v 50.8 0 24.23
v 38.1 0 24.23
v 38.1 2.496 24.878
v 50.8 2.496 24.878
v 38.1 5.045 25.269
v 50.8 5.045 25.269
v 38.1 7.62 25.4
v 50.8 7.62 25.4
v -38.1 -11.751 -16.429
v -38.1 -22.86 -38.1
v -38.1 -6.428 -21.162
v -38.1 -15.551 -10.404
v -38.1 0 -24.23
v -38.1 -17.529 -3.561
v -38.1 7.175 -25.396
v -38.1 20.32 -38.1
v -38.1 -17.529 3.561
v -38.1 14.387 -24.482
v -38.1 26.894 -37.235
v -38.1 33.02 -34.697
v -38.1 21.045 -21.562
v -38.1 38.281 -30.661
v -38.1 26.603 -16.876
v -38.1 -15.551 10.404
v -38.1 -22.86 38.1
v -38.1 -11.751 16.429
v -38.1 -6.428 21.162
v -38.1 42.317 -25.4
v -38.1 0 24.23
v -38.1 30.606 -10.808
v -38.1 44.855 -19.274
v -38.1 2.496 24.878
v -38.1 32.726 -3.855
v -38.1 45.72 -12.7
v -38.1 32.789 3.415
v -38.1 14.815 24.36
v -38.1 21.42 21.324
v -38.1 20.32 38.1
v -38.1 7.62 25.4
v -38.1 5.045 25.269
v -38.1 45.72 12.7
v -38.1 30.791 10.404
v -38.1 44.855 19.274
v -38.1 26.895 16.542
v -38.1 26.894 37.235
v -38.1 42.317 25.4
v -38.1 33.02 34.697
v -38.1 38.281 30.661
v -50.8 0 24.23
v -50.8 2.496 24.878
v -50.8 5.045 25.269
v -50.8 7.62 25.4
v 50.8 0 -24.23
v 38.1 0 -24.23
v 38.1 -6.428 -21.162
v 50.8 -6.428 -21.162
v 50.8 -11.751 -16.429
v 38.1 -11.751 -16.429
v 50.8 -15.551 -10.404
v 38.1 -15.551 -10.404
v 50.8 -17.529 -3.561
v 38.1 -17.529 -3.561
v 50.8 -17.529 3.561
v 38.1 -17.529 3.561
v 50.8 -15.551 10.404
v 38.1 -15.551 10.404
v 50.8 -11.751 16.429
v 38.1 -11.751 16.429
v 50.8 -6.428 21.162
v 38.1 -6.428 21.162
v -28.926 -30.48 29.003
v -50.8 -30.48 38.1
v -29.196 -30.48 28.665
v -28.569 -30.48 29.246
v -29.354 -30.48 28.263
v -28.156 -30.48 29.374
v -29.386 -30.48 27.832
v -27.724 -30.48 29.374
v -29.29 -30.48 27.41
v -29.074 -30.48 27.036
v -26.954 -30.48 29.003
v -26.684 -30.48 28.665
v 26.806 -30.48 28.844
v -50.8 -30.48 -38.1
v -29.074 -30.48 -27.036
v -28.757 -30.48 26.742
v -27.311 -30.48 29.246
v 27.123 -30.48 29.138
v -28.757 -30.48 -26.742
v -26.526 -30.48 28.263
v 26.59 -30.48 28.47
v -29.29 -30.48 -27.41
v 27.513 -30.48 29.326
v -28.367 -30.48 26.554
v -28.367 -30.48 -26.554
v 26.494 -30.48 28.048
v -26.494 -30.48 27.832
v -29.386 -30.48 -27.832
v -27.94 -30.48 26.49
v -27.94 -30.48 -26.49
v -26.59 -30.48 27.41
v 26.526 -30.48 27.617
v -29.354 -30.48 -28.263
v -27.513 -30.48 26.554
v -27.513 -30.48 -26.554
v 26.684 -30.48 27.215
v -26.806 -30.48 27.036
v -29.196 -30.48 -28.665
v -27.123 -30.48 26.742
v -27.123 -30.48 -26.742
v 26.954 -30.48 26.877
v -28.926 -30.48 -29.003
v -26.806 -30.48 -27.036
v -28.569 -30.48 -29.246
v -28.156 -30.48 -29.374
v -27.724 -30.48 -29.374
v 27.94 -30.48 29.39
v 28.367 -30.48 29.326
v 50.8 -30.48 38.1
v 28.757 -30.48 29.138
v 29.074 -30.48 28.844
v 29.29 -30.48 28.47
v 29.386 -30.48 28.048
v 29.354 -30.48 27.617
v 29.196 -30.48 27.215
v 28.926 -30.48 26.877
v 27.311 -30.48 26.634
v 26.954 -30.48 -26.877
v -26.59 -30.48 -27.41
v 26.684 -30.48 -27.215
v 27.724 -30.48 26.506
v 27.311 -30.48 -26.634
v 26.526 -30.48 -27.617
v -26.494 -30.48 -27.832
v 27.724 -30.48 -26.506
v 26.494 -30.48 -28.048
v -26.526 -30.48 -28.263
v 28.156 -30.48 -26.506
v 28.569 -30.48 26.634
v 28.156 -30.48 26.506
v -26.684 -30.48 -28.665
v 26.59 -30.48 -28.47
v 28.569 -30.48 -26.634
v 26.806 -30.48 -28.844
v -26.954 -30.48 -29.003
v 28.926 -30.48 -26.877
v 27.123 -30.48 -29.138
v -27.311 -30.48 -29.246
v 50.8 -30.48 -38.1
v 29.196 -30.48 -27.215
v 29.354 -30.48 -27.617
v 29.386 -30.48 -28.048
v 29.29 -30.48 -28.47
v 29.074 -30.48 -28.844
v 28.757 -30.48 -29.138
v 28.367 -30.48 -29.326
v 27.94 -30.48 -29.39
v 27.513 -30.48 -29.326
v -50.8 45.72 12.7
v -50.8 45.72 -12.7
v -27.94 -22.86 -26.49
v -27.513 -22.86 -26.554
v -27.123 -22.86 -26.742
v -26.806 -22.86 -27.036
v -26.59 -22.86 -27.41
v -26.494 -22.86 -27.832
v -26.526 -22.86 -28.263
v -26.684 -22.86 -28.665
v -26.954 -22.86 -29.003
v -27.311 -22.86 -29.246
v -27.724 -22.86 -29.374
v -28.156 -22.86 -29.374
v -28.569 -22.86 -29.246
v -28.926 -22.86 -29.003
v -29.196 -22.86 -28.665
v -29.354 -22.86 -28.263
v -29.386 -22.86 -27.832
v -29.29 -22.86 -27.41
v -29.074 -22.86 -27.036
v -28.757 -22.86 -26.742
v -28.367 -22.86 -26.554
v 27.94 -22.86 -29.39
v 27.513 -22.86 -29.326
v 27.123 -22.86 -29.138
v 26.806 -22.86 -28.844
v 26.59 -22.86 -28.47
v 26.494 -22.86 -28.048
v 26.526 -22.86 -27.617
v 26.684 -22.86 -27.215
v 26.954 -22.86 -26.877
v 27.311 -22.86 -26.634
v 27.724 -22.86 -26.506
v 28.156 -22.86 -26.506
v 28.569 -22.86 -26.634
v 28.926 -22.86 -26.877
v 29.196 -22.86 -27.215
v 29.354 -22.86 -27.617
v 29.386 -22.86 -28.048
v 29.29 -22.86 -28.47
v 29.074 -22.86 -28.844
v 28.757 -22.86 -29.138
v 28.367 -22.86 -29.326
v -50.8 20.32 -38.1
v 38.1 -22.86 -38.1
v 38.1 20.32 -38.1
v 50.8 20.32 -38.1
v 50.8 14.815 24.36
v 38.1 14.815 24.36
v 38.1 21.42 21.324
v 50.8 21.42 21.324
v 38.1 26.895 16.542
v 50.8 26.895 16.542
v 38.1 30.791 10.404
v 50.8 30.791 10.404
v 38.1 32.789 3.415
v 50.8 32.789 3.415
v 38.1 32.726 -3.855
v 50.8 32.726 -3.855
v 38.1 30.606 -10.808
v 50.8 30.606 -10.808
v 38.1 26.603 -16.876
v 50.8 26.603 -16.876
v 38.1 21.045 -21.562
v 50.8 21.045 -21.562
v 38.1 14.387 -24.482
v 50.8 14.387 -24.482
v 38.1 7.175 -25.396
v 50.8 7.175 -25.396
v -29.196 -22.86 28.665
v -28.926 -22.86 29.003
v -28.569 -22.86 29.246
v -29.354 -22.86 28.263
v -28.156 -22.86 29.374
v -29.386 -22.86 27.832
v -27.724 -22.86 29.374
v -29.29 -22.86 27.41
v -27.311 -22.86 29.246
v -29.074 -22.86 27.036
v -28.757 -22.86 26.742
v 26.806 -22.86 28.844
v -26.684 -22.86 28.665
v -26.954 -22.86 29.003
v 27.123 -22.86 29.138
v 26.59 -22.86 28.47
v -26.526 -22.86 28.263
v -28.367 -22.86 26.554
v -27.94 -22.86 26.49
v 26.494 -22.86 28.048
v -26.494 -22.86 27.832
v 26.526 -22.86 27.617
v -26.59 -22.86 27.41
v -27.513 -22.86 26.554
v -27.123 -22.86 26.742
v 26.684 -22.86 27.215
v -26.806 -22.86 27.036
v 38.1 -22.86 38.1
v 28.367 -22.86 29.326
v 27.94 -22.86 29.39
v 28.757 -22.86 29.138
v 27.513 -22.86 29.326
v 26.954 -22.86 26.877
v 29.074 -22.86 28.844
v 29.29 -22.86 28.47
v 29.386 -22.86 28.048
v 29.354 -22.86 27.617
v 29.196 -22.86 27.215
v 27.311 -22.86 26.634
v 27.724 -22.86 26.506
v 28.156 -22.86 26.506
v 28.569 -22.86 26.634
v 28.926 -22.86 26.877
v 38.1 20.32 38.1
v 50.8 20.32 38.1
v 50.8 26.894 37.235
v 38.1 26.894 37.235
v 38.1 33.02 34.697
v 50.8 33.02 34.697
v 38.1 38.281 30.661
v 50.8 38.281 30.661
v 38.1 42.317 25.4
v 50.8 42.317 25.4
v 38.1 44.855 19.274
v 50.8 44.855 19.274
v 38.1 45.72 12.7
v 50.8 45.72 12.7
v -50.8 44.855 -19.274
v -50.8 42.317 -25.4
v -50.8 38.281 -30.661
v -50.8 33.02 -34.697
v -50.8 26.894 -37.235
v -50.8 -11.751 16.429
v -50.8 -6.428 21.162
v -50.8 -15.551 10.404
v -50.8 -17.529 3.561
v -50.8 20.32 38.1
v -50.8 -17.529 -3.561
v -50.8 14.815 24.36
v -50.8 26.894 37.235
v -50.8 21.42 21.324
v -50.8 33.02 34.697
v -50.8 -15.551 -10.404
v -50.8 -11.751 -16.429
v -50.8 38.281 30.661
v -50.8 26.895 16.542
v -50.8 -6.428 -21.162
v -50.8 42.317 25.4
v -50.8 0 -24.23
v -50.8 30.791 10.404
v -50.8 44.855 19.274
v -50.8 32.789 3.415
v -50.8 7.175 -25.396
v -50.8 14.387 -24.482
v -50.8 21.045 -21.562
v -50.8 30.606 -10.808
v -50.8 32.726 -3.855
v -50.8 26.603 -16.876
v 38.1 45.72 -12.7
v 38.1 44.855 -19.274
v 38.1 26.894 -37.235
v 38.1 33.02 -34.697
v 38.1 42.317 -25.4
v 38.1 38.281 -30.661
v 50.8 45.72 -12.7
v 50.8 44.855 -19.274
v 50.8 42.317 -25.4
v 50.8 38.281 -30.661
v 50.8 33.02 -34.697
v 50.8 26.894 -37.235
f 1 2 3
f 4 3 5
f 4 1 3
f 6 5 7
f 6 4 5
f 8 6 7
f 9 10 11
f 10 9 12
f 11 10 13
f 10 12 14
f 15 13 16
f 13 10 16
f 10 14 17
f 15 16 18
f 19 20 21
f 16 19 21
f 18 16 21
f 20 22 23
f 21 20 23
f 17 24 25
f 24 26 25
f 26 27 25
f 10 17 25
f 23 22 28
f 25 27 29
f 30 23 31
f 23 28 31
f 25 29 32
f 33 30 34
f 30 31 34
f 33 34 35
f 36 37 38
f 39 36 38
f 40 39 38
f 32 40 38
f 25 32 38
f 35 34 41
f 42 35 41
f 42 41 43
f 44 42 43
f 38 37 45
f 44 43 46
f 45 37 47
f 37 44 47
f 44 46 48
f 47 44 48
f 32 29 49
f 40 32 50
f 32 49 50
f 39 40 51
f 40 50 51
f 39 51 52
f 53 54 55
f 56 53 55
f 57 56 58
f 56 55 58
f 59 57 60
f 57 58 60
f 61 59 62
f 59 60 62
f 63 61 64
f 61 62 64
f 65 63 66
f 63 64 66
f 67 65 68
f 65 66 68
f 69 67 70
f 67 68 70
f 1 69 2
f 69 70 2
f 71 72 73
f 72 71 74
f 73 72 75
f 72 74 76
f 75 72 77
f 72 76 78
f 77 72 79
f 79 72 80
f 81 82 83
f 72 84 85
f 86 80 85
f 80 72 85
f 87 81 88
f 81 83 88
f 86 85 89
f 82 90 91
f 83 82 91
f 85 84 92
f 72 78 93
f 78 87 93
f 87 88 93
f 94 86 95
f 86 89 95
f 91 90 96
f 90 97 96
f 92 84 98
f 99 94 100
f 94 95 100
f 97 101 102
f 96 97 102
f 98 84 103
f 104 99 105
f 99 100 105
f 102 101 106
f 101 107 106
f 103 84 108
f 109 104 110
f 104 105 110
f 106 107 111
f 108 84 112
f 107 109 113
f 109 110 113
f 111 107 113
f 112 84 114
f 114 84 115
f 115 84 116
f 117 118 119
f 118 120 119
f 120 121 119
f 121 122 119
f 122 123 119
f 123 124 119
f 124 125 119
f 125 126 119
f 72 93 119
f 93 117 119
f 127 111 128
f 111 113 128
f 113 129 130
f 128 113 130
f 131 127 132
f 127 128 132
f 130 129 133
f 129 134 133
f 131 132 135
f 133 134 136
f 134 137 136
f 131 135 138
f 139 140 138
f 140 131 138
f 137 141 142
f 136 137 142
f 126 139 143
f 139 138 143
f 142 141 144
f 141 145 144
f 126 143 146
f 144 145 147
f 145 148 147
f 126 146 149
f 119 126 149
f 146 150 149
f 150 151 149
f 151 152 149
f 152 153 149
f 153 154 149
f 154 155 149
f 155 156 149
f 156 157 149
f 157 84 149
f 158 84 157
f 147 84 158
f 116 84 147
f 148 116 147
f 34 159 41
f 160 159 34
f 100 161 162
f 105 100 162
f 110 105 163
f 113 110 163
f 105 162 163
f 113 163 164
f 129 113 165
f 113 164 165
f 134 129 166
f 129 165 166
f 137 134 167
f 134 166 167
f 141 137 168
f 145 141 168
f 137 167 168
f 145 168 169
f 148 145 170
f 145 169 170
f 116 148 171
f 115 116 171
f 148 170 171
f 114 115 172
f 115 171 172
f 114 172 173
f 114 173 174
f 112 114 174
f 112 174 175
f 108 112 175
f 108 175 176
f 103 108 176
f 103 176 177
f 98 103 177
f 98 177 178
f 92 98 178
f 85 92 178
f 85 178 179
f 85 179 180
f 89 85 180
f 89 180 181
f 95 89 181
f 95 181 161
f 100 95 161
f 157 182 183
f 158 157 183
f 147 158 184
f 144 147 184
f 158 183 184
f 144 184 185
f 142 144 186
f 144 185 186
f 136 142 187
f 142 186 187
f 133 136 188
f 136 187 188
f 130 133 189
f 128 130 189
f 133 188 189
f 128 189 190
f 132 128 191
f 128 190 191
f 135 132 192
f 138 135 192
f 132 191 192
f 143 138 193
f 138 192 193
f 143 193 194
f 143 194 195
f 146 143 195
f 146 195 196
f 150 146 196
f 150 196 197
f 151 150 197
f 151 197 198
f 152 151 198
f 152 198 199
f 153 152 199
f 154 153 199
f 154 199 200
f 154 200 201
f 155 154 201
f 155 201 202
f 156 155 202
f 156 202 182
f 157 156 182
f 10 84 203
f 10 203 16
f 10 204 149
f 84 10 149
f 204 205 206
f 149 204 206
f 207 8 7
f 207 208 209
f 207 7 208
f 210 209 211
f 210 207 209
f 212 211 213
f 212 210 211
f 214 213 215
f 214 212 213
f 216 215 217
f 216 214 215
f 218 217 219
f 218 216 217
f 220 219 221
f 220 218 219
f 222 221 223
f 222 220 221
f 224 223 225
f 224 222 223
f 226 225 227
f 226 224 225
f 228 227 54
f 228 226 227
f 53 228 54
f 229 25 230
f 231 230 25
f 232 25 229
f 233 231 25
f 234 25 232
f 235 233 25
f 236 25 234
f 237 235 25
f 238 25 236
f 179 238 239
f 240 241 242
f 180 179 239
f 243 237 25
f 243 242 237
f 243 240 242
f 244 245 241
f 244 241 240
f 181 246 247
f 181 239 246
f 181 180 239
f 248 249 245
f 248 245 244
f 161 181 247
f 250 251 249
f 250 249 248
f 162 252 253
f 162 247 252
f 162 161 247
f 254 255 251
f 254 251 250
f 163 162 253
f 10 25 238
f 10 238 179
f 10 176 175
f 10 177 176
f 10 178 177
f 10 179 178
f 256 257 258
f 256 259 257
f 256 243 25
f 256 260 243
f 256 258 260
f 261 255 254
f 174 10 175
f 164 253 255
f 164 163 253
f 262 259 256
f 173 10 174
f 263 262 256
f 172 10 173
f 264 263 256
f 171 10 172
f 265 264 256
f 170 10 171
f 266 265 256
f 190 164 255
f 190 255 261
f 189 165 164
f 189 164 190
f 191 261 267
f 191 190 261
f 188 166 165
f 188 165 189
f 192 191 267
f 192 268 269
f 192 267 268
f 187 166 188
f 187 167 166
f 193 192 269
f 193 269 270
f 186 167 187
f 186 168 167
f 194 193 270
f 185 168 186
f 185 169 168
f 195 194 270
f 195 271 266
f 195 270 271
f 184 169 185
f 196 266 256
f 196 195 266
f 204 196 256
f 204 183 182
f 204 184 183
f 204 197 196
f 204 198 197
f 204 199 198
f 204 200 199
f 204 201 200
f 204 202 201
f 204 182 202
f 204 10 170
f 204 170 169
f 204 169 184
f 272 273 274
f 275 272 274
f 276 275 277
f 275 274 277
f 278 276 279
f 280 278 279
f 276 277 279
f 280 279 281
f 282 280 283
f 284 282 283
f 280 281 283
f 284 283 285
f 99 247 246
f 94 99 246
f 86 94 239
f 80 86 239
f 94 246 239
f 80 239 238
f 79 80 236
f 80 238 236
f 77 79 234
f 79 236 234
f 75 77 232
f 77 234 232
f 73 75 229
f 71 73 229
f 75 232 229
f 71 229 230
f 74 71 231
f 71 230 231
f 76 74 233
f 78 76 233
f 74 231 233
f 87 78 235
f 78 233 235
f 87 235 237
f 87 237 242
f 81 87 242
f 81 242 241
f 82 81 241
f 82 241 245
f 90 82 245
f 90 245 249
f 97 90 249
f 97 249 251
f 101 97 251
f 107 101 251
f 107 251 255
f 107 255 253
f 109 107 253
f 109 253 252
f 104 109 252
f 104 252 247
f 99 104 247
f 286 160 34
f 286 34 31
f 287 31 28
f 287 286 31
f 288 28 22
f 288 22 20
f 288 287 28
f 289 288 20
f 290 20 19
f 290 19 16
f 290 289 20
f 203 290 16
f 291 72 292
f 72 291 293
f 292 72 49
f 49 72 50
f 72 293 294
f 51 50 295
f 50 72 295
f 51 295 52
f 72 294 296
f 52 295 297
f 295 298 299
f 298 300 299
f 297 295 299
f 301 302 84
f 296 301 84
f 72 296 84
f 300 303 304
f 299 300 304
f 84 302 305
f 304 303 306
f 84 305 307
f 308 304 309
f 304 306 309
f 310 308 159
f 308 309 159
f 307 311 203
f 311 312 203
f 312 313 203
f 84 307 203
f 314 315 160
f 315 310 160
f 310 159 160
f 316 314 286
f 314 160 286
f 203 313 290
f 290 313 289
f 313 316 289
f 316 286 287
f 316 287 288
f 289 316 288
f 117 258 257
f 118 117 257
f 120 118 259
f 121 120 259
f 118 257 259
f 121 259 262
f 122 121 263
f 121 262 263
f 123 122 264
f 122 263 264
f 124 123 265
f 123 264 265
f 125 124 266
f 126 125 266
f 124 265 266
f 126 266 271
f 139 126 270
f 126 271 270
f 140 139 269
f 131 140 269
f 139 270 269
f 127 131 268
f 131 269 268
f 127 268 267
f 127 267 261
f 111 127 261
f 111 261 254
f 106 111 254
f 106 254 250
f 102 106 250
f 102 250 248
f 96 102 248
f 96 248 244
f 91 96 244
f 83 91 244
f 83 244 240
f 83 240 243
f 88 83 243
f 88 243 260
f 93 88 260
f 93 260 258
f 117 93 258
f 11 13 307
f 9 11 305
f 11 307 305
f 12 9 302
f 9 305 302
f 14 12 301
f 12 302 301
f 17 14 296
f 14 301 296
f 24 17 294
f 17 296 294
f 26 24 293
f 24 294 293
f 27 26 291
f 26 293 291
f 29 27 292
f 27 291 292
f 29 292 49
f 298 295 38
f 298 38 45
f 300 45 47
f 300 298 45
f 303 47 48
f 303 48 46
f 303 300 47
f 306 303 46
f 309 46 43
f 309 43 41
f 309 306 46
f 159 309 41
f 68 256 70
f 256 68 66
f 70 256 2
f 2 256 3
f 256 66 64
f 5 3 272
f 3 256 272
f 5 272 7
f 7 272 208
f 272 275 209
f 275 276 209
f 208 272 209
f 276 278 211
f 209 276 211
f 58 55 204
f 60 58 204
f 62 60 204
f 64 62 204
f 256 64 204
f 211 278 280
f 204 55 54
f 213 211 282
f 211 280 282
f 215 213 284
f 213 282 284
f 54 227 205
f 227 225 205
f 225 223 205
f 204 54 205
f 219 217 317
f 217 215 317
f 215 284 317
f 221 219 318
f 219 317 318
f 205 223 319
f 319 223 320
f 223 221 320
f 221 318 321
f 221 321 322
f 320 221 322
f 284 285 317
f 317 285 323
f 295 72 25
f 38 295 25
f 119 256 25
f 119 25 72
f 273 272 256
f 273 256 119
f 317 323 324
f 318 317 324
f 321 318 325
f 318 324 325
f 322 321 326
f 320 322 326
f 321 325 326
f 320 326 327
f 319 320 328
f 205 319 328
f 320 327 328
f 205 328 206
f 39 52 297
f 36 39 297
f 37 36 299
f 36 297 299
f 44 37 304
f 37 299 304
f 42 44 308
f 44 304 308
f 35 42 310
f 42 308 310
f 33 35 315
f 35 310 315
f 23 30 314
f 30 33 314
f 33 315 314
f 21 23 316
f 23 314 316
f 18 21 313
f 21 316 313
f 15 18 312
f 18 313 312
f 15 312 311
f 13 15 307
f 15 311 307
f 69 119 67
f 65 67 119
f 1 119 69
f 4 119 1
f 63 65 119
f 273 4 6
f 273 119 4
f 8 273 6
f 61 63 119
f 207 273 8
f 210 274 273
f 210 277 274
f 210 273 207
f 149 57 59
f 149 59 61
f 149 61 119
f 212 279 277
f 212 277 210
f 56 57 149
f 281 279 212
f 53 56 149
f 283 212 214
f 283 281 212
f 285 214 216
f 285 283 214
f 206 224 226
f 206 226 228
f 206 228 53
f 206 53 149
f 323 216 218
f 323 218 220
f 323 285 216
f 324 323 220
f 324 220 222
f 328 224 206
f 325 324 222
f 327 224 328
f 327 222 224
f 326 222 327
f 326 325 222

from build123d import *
from build123d.topology import SkipClean

# Parameters (mm, degrees)
SKETCH1_W           = 101.6
SKETCH1_H           = 76.2
BOSS_EXTRUDE1_DEPTH = 30.48
SKETCH2_R           = 25.4
BOSS_EXTRUDE2_DEPTH = 12.7
SKETCH3_W           = 76.2
SKETCH3_H           = 76.2
CUT_EXTRUDE1_DEPTH  = 22.86
SKETCH5_R           = 25.4
CUT_EXTRUDE3_DEPTH  = 256.032
SKETCH6_R           = 1.45
CUT_EXTRUDE4_DEPTH  = 256.032


with BuildPart() as part:
    # Sketch1 → Boss-Extrude1 (new body)
    with BuildSketch(Plane(origin=(0, 0, 0), x_dir=(1, 0, 0), z_dir=(0, 1, 0))):
        Rectangle(SKETCH1_W, SKETCH1_H)
    extrude(amount=-BOSS_EXTRUDE1_DEPTH)

    # Sketch2 → Boss-Extrude2 (add)
    with BuildSketch(Plane.ZY.offset(50.8)):
        with BuildLine():
            Line((-38.1, -30.48), (38.1, -30.48))
            Line((38.1, -30.48), (38.1, 20.32))
            ThreePointArc((38.1, 20.32), (30.660512242, 38.280512242), (12.7, 45.72))
            Line((12.7, 45.72), (-12.7, 45.72))
            ThreePointArc((-12.7, 45.72), (-30.660512242, 38.280512242), (-38.1, 20.32))
            Line((-38.1, 20.32), (-38.1, -30.48))
        make_face()
        with Locations((0, 7.62)):
            Circle(SKETCH2_R, mode=Mode.SUBTRACT)
    boss_extrude2 = extrude(amount=-BOSS_EXTRUDE2_DEPTH)

    # Mirror1: Boss-Extrude2 across plane
    add(boss_extrude2.mirror(Plane(origin=(0, 0, 0), x_dir=(0, 0, 1), z_dir=(1, 0, 0))))

    # Sketch3 → Cut-Extrude1 (cut)
    with BuildSketch(Plane(origin=(0, 0, 0), x_dir=(1, 0, 0), z_dir=(0, 1, 0))):
        Rectangle(SKETCH3_W, SKETCH3_H)
    extrude(amount=-CUT_EXTRUDE1_DEPTH, mode=Mode.SUBTRACT)

    # Sketch5 → Cut-Extrude3 (cut)
    with SkipClean():  # the faces are left unmerged after this step: merging them gives an invalid solid
        with BuildSketch(Plane.ZY.offset(50.8)):
            with Locations((0, 7.62)):
                Circle(SKETCH5_R)
        extrude(amount=-CUT_EXTRUDE3_DEPTH, mode=Mode.SUBTRACT)

    # Sketch6 → Cut-Extrude4 (cut)
    with SkipClean():  # the faces are left unmerged after this step: merging them gives an invalid solid
        with BuildSketch(Plane(origin=(0, -22.86, 0), x_dir=(1, 0, 0), z_dir=(0, 1, 0))):
            with Locations(Location((-27.94, 27.94, 0), (0, 0, 270))):
                Circle(SKETCH6_R)
            with Locations(Location((27.94, 27.94, 0), (0, 0, 90))):
                Circle(SKETCH6_R)
            with Locations(Location((27.94, -27.94, 0), (0, 0, 270))):
                Circle(SKETCH6_R)
            with Locations(Location((-27.94, -27.94, 0), (0, 0, 90))):
                Circle(SKETCH6_R)
        extrude(amount=-CUT_EXTRUDE4_DEPTH, mode=Mode.SUBTRACT)


solid = part.part
